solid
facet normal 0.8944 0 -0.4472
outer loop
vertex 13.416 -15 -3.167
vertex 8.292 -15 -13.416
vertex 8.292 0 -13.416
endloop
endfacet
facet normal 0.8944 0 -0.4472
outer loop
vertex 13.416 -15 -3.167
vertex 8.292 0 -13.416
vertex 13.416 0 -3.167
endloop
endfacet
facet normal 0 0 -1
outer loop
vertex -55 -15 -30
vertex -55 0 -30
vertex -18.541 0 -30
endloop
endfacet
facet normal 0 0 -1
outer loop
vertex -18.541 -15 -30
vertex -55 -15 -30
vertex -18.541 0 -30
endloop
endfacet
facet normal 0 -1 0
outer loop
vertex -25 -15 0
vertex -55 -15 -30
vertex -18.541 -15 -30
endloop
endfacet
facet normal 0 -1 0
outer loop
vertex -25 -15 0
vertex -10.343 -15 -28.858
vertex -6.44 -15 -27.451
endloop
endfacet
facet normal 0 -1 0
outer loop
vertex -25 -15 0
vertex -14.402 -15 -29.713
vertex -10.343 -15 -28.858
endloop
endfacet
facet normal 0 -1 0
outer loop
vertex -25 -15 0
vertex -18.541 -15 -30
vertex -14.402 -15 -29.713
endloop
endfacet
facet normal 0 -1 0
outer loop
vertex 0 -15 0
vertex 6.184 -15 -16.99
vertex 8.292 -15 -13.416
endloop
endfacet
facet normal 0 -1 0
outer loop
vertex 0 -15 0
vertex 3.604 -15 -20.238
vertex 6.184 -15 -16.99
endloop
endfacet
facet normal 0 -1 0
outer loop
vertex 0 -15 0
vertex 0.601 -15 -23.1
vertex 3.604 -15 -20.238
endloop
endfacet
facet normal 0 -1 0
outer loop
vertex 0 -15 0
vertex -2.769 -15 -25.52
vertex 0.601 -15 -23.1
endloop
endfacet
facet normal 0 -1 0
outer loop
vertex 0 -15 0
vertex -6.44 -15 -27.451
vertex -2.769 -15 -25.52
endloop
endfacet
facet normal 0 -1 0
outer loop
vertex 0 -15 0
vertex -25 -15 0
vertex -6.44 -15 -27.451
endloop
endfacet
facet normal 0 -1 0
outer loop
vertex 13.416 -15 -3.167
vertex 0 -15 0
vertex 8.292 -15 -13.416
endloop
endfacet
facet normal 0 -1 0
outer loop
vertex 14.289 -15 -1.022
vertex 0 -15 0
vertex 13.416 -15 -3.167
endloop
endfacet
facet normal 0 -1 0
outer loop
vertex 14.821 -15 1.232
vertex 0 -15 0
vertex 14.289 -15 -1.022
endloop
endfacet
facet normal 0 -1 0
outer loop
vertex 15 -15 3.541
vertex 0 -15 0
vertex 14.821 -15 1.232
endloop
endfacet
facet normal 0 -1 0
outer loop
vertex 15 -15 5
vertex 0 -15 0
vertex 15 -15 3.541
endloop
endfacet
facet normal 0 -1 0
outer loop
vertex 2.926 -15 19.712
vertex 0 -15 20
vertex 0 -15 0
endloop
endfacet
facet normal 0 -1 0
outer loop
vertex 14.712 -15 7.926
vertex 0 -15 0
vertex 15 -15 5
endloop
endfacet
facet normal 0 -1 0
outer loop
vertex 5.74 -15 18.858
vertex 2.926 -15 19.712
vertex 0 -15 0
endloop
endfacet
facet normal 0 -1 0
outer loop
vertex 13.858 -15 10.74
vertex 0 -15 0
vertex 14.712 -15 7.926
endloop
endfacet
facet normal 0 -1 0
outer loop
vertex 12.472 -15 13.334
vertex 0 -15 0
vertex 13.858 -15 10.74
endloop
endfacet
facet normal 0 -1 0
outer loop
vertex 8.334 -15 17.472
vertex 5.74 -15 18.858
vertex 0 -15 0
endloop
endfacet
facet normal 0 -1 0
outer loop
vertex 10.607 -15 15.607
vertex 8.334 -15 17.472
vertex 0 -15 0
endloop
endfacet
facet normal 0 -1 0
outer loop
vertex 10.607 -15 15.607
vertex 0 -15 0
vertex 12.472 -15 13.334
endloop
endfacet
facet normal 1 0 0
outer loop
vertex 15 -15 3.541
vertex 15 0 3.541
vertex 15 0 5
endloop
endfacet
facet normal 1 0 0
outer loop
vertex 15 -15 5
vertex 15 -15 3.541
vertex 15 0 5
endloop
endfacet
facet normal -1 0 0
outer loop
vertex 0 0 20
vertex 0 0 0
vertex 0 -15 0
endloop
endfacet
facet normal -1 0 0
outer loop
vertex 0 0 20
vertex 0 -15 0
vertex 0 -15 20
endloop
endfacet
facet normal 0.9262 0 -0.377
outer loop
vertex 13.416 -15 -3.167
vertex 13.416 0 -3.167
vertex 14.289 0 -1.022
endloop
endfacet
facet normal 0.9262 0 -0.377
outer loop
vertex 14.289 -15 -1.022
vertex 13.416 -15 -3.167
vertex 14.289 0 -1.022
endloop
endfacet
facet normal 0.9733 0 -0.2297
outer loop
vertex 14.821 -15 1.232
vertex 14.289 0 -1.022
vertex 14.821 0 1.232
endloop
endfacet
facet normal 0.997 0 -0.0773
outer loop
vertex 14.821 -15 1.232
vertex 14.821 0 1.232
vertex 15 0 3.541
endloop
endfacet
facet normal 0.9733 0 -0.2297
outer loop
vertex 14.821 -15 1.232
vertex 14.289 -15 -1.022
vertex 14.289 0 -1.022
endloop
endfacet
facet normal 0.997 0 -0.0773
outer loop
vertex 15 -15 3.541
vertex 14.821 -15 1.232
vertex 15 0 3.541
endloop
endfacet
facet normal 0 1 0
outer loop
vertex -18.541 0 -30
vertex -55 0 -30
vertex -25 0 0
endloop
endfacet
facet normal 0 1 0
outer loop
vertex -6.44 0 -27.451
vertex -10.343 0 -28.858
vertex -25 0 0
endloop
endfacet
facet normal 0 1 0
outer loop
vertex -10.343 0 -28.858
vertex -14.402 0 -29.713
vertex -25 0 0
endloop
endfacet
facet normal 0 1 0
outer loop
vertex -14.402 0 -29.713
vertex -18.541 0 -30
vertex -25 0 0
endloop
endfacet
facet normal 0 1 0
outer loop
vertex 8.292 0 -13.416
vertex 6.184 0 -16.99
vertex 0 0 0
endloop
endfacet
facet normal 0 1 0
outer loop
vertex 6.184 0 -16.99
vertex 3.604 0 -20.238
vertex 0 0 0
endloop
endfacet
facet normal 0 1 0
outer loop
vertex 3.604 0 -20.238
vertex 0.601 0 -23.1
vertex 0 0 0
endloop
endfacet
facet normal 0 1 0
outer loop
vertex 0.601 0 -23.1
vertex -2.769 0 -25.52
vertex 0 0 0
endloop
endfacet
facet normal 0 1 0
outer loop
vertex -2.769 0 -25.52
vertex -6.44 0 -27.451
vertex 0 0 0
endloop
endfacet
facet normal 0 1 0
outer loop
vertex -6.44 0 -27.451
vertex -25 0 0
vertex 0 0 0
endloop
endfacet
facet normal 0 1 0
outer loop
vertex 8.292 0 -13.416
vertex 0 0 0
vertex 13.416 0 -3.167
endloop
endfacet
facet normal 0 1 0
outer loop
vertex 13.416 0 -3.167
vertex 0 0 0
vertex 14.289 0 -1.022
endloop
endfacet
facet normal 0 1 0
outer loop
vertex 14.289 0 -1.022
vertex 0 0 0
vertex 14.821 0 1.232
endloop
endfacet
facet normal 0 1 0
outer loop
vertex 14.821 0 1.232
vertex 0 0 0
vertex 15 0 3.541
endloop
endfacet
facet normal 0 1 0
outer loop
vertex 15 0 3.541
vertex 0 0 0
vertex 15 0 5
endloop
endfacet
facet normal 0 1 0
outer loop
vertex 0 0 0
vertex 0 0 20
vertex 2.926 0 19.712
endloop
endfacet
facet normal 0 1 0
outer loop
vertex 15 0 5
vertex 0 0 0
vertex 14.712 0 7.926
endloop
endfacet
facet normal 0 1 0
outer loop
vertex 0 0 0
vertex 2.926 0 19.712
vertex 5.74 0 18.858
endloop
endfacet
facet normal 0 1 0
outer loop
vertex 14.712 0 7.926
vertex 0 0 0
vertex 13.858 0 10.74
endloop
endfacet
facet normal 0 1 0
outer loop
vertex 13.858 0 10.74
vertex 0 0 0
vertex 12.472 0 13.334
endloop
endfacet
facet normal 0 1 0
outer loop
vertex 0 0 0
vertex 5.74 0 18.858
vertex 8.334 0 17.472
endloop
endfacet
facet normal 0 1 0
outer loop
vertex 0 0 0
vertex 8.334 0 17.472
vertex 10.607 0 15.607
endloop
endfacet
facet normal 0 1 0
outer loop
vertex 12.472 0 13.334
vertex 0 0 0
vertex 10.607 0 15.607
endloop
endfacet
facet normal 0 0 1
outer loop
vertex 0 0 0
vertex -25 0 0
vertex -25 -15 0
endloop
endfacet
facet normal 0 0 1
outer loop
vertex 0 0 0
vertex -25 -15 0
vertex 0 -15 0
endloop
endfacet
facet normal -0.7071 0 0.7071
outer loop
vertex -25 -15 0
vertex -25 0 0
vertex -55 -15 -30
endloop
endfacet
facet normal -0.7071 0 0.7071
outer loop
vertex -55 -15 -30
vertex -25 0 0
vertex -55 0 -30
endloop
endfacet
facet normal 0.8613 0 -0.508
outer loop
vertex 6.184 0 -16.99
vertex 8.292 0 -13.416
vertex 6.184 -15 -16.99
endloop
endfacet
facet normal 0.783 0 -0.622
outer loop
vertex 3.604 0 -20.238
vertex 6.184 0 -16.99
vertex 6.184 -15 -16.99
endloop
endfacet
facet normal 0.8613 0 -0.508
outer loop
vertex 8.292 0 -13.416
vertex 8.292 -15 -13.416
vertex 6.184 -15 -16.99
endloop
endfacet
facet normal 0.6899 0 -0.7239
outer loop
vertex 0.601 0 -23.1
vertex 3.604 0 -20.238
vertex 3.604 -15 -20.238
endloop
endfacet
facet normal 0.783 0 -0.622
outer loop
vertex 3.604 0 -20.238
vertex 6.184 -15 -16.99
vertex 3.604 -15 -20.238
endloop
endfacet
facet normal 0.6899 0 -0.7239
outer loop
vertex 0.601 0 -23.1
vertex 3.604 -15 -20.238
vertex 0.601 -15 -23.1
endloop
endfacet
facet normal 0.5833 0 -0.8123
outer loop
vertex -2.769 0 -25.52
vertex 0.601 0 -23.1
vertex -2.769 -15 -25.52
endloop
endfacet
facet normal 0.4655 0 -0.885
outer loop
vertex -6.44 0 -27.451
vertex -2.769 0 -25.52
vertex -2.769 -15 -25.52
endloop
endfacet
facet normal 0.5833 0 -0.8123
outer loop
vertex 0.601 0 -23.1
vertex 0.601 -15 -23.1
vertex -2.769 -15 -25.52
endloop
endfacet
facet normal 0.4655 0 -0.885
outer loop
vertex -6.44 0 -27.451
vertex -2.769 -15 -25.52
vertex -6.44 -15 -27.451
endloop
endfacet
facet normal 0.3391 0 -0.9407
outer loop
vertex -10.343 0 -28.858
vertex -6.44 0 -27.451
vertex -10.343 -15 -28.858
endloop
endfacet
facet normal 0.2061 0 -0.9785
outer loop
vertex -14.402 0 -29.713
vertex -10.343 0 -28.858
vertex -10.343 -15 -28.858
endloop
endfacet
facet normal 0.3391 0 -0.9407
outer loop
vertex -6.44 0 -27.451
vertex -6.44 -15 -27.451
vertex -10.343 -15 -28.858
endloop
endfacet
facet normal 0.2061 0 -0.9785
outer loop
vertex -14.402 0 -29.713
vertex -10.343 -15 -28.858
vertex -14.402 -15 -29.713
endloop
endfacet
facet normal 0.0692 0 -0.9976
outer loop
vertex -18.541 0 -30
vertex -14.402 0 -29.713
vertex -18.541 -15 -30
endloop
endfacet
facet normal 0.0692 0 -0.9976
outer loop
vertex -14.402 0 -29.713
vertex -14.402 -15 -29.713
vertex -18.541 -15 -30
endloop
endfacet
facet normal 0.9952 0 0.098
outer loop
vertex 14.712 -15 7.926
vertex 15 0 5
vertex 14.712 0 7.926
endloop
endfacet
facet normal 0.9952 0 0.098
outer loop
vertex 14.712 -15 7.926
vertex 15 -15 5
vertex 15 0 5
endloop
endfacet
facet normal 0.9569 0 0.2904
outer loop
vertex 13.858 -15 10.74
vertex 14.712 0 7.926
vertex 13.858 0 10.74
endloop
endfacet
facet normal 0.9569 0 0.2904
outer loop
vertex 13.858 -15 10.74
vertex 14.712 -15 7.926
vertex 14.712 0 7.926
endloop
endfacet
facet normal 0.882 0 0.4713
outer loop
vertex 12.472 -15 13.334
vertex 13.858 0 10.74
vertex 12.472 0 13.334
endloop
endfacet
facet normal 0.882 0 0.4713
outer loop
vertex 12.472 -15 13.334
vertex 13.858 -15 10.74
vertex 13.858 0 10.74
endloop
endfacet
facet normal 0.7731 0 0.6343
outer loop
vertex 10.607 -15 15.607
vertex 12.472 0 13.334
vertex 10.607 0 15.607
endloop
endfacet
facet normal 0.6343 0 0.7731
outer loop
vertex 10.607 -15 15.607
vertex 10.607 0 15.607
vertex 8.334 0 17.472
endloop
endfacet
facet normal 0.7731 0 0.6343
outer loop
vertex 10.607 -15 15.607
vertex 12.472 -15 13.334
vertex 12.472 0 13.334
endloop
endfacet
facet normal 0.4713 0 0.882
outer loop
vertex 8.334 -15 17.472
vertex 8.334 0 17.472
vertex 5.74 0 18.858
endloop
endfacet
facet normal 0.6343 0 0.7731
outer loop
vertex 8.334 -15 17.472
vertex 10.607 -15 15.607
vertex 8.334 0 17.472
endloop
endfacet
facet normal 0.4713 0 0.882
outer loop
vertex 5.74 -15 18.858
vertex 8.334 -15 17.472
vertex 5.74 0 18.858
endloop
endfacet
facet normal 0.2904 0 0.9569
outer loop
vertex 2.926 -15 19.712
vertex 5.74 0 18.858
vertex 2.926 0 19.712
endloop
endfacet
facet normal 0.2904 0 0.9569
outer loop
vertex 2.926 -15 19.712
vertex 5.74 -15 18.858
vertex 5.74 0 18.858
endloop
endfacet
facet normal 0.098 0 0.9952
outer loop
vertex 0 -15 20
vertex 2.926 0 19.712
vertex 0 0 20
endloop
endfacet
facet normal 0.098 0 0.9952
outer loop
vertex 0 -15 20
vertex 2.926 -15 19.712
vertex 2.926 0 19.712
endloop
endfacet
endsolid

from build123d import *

# Parameters (mm, degrees)
F3_W     = 15
F3_H     = 20
F3_W_2   = 55
F3_H_2   = 30
F4_DEPTH = 15
F5_R     = 15
F6_R     = 30
F7_R     = 14.99999
F9_DEPTH = 15.001


# Not quite as in the source:
# - a fillet or chamfer is up to 0.001 mm smaller than in the source, because OpenCascade refuses the exact size


with BuildPart() as f4:
    # F3 (on Front) → F4 (new body)
    with BuildSketch(Plane.XZ):
        with Locations((7.5, 10)):
            Rectangle(F3_W, F3_H)
        with Locations((-27.5, -15)):
            Rectangle(F3_W_2, F3_H_2)
        Polygon((15, 0), (0, 0), (0, -30), align=None)
    extrude(amount=F4_DEPTH)

    # F5
    f5_edges = [f4.edges().sort_by_distance(p)[0] for p in [
        (15, -7.5, 0),
    ]]
    fillet(f5_edges, radius=F5_R)

    # F6
    f6_edges = [f4.edges().sort_by_distance(p)[0] for p in [
        (0, -7.5, -30),
    ]]
    fillet(f6_edges, radius=F6_R)

    # F7 (radius 15 in the source; OpenCascade refuses exactly that, so slightly less here)
    f7_edges = [f4.edges().sort_by_distance(p)[0] for p in [
        (15, -7.5, 20),
    ]]
    fillet(f7_edges, radius=F7_R)

    # F8 (on face) → F9 (cut, through all)
    with BuildSketch(Plane(origin=(0, 0, 0), x_dir=(-1, 0, 0), z_dir=(0, 1, 0))):
        Polygon((25, 0), (55, -30), (55, 0), align=None)
    extrude(amount=-F9_DEPTH, mode=Mode.SUBTRACT)


solid = f4.part
